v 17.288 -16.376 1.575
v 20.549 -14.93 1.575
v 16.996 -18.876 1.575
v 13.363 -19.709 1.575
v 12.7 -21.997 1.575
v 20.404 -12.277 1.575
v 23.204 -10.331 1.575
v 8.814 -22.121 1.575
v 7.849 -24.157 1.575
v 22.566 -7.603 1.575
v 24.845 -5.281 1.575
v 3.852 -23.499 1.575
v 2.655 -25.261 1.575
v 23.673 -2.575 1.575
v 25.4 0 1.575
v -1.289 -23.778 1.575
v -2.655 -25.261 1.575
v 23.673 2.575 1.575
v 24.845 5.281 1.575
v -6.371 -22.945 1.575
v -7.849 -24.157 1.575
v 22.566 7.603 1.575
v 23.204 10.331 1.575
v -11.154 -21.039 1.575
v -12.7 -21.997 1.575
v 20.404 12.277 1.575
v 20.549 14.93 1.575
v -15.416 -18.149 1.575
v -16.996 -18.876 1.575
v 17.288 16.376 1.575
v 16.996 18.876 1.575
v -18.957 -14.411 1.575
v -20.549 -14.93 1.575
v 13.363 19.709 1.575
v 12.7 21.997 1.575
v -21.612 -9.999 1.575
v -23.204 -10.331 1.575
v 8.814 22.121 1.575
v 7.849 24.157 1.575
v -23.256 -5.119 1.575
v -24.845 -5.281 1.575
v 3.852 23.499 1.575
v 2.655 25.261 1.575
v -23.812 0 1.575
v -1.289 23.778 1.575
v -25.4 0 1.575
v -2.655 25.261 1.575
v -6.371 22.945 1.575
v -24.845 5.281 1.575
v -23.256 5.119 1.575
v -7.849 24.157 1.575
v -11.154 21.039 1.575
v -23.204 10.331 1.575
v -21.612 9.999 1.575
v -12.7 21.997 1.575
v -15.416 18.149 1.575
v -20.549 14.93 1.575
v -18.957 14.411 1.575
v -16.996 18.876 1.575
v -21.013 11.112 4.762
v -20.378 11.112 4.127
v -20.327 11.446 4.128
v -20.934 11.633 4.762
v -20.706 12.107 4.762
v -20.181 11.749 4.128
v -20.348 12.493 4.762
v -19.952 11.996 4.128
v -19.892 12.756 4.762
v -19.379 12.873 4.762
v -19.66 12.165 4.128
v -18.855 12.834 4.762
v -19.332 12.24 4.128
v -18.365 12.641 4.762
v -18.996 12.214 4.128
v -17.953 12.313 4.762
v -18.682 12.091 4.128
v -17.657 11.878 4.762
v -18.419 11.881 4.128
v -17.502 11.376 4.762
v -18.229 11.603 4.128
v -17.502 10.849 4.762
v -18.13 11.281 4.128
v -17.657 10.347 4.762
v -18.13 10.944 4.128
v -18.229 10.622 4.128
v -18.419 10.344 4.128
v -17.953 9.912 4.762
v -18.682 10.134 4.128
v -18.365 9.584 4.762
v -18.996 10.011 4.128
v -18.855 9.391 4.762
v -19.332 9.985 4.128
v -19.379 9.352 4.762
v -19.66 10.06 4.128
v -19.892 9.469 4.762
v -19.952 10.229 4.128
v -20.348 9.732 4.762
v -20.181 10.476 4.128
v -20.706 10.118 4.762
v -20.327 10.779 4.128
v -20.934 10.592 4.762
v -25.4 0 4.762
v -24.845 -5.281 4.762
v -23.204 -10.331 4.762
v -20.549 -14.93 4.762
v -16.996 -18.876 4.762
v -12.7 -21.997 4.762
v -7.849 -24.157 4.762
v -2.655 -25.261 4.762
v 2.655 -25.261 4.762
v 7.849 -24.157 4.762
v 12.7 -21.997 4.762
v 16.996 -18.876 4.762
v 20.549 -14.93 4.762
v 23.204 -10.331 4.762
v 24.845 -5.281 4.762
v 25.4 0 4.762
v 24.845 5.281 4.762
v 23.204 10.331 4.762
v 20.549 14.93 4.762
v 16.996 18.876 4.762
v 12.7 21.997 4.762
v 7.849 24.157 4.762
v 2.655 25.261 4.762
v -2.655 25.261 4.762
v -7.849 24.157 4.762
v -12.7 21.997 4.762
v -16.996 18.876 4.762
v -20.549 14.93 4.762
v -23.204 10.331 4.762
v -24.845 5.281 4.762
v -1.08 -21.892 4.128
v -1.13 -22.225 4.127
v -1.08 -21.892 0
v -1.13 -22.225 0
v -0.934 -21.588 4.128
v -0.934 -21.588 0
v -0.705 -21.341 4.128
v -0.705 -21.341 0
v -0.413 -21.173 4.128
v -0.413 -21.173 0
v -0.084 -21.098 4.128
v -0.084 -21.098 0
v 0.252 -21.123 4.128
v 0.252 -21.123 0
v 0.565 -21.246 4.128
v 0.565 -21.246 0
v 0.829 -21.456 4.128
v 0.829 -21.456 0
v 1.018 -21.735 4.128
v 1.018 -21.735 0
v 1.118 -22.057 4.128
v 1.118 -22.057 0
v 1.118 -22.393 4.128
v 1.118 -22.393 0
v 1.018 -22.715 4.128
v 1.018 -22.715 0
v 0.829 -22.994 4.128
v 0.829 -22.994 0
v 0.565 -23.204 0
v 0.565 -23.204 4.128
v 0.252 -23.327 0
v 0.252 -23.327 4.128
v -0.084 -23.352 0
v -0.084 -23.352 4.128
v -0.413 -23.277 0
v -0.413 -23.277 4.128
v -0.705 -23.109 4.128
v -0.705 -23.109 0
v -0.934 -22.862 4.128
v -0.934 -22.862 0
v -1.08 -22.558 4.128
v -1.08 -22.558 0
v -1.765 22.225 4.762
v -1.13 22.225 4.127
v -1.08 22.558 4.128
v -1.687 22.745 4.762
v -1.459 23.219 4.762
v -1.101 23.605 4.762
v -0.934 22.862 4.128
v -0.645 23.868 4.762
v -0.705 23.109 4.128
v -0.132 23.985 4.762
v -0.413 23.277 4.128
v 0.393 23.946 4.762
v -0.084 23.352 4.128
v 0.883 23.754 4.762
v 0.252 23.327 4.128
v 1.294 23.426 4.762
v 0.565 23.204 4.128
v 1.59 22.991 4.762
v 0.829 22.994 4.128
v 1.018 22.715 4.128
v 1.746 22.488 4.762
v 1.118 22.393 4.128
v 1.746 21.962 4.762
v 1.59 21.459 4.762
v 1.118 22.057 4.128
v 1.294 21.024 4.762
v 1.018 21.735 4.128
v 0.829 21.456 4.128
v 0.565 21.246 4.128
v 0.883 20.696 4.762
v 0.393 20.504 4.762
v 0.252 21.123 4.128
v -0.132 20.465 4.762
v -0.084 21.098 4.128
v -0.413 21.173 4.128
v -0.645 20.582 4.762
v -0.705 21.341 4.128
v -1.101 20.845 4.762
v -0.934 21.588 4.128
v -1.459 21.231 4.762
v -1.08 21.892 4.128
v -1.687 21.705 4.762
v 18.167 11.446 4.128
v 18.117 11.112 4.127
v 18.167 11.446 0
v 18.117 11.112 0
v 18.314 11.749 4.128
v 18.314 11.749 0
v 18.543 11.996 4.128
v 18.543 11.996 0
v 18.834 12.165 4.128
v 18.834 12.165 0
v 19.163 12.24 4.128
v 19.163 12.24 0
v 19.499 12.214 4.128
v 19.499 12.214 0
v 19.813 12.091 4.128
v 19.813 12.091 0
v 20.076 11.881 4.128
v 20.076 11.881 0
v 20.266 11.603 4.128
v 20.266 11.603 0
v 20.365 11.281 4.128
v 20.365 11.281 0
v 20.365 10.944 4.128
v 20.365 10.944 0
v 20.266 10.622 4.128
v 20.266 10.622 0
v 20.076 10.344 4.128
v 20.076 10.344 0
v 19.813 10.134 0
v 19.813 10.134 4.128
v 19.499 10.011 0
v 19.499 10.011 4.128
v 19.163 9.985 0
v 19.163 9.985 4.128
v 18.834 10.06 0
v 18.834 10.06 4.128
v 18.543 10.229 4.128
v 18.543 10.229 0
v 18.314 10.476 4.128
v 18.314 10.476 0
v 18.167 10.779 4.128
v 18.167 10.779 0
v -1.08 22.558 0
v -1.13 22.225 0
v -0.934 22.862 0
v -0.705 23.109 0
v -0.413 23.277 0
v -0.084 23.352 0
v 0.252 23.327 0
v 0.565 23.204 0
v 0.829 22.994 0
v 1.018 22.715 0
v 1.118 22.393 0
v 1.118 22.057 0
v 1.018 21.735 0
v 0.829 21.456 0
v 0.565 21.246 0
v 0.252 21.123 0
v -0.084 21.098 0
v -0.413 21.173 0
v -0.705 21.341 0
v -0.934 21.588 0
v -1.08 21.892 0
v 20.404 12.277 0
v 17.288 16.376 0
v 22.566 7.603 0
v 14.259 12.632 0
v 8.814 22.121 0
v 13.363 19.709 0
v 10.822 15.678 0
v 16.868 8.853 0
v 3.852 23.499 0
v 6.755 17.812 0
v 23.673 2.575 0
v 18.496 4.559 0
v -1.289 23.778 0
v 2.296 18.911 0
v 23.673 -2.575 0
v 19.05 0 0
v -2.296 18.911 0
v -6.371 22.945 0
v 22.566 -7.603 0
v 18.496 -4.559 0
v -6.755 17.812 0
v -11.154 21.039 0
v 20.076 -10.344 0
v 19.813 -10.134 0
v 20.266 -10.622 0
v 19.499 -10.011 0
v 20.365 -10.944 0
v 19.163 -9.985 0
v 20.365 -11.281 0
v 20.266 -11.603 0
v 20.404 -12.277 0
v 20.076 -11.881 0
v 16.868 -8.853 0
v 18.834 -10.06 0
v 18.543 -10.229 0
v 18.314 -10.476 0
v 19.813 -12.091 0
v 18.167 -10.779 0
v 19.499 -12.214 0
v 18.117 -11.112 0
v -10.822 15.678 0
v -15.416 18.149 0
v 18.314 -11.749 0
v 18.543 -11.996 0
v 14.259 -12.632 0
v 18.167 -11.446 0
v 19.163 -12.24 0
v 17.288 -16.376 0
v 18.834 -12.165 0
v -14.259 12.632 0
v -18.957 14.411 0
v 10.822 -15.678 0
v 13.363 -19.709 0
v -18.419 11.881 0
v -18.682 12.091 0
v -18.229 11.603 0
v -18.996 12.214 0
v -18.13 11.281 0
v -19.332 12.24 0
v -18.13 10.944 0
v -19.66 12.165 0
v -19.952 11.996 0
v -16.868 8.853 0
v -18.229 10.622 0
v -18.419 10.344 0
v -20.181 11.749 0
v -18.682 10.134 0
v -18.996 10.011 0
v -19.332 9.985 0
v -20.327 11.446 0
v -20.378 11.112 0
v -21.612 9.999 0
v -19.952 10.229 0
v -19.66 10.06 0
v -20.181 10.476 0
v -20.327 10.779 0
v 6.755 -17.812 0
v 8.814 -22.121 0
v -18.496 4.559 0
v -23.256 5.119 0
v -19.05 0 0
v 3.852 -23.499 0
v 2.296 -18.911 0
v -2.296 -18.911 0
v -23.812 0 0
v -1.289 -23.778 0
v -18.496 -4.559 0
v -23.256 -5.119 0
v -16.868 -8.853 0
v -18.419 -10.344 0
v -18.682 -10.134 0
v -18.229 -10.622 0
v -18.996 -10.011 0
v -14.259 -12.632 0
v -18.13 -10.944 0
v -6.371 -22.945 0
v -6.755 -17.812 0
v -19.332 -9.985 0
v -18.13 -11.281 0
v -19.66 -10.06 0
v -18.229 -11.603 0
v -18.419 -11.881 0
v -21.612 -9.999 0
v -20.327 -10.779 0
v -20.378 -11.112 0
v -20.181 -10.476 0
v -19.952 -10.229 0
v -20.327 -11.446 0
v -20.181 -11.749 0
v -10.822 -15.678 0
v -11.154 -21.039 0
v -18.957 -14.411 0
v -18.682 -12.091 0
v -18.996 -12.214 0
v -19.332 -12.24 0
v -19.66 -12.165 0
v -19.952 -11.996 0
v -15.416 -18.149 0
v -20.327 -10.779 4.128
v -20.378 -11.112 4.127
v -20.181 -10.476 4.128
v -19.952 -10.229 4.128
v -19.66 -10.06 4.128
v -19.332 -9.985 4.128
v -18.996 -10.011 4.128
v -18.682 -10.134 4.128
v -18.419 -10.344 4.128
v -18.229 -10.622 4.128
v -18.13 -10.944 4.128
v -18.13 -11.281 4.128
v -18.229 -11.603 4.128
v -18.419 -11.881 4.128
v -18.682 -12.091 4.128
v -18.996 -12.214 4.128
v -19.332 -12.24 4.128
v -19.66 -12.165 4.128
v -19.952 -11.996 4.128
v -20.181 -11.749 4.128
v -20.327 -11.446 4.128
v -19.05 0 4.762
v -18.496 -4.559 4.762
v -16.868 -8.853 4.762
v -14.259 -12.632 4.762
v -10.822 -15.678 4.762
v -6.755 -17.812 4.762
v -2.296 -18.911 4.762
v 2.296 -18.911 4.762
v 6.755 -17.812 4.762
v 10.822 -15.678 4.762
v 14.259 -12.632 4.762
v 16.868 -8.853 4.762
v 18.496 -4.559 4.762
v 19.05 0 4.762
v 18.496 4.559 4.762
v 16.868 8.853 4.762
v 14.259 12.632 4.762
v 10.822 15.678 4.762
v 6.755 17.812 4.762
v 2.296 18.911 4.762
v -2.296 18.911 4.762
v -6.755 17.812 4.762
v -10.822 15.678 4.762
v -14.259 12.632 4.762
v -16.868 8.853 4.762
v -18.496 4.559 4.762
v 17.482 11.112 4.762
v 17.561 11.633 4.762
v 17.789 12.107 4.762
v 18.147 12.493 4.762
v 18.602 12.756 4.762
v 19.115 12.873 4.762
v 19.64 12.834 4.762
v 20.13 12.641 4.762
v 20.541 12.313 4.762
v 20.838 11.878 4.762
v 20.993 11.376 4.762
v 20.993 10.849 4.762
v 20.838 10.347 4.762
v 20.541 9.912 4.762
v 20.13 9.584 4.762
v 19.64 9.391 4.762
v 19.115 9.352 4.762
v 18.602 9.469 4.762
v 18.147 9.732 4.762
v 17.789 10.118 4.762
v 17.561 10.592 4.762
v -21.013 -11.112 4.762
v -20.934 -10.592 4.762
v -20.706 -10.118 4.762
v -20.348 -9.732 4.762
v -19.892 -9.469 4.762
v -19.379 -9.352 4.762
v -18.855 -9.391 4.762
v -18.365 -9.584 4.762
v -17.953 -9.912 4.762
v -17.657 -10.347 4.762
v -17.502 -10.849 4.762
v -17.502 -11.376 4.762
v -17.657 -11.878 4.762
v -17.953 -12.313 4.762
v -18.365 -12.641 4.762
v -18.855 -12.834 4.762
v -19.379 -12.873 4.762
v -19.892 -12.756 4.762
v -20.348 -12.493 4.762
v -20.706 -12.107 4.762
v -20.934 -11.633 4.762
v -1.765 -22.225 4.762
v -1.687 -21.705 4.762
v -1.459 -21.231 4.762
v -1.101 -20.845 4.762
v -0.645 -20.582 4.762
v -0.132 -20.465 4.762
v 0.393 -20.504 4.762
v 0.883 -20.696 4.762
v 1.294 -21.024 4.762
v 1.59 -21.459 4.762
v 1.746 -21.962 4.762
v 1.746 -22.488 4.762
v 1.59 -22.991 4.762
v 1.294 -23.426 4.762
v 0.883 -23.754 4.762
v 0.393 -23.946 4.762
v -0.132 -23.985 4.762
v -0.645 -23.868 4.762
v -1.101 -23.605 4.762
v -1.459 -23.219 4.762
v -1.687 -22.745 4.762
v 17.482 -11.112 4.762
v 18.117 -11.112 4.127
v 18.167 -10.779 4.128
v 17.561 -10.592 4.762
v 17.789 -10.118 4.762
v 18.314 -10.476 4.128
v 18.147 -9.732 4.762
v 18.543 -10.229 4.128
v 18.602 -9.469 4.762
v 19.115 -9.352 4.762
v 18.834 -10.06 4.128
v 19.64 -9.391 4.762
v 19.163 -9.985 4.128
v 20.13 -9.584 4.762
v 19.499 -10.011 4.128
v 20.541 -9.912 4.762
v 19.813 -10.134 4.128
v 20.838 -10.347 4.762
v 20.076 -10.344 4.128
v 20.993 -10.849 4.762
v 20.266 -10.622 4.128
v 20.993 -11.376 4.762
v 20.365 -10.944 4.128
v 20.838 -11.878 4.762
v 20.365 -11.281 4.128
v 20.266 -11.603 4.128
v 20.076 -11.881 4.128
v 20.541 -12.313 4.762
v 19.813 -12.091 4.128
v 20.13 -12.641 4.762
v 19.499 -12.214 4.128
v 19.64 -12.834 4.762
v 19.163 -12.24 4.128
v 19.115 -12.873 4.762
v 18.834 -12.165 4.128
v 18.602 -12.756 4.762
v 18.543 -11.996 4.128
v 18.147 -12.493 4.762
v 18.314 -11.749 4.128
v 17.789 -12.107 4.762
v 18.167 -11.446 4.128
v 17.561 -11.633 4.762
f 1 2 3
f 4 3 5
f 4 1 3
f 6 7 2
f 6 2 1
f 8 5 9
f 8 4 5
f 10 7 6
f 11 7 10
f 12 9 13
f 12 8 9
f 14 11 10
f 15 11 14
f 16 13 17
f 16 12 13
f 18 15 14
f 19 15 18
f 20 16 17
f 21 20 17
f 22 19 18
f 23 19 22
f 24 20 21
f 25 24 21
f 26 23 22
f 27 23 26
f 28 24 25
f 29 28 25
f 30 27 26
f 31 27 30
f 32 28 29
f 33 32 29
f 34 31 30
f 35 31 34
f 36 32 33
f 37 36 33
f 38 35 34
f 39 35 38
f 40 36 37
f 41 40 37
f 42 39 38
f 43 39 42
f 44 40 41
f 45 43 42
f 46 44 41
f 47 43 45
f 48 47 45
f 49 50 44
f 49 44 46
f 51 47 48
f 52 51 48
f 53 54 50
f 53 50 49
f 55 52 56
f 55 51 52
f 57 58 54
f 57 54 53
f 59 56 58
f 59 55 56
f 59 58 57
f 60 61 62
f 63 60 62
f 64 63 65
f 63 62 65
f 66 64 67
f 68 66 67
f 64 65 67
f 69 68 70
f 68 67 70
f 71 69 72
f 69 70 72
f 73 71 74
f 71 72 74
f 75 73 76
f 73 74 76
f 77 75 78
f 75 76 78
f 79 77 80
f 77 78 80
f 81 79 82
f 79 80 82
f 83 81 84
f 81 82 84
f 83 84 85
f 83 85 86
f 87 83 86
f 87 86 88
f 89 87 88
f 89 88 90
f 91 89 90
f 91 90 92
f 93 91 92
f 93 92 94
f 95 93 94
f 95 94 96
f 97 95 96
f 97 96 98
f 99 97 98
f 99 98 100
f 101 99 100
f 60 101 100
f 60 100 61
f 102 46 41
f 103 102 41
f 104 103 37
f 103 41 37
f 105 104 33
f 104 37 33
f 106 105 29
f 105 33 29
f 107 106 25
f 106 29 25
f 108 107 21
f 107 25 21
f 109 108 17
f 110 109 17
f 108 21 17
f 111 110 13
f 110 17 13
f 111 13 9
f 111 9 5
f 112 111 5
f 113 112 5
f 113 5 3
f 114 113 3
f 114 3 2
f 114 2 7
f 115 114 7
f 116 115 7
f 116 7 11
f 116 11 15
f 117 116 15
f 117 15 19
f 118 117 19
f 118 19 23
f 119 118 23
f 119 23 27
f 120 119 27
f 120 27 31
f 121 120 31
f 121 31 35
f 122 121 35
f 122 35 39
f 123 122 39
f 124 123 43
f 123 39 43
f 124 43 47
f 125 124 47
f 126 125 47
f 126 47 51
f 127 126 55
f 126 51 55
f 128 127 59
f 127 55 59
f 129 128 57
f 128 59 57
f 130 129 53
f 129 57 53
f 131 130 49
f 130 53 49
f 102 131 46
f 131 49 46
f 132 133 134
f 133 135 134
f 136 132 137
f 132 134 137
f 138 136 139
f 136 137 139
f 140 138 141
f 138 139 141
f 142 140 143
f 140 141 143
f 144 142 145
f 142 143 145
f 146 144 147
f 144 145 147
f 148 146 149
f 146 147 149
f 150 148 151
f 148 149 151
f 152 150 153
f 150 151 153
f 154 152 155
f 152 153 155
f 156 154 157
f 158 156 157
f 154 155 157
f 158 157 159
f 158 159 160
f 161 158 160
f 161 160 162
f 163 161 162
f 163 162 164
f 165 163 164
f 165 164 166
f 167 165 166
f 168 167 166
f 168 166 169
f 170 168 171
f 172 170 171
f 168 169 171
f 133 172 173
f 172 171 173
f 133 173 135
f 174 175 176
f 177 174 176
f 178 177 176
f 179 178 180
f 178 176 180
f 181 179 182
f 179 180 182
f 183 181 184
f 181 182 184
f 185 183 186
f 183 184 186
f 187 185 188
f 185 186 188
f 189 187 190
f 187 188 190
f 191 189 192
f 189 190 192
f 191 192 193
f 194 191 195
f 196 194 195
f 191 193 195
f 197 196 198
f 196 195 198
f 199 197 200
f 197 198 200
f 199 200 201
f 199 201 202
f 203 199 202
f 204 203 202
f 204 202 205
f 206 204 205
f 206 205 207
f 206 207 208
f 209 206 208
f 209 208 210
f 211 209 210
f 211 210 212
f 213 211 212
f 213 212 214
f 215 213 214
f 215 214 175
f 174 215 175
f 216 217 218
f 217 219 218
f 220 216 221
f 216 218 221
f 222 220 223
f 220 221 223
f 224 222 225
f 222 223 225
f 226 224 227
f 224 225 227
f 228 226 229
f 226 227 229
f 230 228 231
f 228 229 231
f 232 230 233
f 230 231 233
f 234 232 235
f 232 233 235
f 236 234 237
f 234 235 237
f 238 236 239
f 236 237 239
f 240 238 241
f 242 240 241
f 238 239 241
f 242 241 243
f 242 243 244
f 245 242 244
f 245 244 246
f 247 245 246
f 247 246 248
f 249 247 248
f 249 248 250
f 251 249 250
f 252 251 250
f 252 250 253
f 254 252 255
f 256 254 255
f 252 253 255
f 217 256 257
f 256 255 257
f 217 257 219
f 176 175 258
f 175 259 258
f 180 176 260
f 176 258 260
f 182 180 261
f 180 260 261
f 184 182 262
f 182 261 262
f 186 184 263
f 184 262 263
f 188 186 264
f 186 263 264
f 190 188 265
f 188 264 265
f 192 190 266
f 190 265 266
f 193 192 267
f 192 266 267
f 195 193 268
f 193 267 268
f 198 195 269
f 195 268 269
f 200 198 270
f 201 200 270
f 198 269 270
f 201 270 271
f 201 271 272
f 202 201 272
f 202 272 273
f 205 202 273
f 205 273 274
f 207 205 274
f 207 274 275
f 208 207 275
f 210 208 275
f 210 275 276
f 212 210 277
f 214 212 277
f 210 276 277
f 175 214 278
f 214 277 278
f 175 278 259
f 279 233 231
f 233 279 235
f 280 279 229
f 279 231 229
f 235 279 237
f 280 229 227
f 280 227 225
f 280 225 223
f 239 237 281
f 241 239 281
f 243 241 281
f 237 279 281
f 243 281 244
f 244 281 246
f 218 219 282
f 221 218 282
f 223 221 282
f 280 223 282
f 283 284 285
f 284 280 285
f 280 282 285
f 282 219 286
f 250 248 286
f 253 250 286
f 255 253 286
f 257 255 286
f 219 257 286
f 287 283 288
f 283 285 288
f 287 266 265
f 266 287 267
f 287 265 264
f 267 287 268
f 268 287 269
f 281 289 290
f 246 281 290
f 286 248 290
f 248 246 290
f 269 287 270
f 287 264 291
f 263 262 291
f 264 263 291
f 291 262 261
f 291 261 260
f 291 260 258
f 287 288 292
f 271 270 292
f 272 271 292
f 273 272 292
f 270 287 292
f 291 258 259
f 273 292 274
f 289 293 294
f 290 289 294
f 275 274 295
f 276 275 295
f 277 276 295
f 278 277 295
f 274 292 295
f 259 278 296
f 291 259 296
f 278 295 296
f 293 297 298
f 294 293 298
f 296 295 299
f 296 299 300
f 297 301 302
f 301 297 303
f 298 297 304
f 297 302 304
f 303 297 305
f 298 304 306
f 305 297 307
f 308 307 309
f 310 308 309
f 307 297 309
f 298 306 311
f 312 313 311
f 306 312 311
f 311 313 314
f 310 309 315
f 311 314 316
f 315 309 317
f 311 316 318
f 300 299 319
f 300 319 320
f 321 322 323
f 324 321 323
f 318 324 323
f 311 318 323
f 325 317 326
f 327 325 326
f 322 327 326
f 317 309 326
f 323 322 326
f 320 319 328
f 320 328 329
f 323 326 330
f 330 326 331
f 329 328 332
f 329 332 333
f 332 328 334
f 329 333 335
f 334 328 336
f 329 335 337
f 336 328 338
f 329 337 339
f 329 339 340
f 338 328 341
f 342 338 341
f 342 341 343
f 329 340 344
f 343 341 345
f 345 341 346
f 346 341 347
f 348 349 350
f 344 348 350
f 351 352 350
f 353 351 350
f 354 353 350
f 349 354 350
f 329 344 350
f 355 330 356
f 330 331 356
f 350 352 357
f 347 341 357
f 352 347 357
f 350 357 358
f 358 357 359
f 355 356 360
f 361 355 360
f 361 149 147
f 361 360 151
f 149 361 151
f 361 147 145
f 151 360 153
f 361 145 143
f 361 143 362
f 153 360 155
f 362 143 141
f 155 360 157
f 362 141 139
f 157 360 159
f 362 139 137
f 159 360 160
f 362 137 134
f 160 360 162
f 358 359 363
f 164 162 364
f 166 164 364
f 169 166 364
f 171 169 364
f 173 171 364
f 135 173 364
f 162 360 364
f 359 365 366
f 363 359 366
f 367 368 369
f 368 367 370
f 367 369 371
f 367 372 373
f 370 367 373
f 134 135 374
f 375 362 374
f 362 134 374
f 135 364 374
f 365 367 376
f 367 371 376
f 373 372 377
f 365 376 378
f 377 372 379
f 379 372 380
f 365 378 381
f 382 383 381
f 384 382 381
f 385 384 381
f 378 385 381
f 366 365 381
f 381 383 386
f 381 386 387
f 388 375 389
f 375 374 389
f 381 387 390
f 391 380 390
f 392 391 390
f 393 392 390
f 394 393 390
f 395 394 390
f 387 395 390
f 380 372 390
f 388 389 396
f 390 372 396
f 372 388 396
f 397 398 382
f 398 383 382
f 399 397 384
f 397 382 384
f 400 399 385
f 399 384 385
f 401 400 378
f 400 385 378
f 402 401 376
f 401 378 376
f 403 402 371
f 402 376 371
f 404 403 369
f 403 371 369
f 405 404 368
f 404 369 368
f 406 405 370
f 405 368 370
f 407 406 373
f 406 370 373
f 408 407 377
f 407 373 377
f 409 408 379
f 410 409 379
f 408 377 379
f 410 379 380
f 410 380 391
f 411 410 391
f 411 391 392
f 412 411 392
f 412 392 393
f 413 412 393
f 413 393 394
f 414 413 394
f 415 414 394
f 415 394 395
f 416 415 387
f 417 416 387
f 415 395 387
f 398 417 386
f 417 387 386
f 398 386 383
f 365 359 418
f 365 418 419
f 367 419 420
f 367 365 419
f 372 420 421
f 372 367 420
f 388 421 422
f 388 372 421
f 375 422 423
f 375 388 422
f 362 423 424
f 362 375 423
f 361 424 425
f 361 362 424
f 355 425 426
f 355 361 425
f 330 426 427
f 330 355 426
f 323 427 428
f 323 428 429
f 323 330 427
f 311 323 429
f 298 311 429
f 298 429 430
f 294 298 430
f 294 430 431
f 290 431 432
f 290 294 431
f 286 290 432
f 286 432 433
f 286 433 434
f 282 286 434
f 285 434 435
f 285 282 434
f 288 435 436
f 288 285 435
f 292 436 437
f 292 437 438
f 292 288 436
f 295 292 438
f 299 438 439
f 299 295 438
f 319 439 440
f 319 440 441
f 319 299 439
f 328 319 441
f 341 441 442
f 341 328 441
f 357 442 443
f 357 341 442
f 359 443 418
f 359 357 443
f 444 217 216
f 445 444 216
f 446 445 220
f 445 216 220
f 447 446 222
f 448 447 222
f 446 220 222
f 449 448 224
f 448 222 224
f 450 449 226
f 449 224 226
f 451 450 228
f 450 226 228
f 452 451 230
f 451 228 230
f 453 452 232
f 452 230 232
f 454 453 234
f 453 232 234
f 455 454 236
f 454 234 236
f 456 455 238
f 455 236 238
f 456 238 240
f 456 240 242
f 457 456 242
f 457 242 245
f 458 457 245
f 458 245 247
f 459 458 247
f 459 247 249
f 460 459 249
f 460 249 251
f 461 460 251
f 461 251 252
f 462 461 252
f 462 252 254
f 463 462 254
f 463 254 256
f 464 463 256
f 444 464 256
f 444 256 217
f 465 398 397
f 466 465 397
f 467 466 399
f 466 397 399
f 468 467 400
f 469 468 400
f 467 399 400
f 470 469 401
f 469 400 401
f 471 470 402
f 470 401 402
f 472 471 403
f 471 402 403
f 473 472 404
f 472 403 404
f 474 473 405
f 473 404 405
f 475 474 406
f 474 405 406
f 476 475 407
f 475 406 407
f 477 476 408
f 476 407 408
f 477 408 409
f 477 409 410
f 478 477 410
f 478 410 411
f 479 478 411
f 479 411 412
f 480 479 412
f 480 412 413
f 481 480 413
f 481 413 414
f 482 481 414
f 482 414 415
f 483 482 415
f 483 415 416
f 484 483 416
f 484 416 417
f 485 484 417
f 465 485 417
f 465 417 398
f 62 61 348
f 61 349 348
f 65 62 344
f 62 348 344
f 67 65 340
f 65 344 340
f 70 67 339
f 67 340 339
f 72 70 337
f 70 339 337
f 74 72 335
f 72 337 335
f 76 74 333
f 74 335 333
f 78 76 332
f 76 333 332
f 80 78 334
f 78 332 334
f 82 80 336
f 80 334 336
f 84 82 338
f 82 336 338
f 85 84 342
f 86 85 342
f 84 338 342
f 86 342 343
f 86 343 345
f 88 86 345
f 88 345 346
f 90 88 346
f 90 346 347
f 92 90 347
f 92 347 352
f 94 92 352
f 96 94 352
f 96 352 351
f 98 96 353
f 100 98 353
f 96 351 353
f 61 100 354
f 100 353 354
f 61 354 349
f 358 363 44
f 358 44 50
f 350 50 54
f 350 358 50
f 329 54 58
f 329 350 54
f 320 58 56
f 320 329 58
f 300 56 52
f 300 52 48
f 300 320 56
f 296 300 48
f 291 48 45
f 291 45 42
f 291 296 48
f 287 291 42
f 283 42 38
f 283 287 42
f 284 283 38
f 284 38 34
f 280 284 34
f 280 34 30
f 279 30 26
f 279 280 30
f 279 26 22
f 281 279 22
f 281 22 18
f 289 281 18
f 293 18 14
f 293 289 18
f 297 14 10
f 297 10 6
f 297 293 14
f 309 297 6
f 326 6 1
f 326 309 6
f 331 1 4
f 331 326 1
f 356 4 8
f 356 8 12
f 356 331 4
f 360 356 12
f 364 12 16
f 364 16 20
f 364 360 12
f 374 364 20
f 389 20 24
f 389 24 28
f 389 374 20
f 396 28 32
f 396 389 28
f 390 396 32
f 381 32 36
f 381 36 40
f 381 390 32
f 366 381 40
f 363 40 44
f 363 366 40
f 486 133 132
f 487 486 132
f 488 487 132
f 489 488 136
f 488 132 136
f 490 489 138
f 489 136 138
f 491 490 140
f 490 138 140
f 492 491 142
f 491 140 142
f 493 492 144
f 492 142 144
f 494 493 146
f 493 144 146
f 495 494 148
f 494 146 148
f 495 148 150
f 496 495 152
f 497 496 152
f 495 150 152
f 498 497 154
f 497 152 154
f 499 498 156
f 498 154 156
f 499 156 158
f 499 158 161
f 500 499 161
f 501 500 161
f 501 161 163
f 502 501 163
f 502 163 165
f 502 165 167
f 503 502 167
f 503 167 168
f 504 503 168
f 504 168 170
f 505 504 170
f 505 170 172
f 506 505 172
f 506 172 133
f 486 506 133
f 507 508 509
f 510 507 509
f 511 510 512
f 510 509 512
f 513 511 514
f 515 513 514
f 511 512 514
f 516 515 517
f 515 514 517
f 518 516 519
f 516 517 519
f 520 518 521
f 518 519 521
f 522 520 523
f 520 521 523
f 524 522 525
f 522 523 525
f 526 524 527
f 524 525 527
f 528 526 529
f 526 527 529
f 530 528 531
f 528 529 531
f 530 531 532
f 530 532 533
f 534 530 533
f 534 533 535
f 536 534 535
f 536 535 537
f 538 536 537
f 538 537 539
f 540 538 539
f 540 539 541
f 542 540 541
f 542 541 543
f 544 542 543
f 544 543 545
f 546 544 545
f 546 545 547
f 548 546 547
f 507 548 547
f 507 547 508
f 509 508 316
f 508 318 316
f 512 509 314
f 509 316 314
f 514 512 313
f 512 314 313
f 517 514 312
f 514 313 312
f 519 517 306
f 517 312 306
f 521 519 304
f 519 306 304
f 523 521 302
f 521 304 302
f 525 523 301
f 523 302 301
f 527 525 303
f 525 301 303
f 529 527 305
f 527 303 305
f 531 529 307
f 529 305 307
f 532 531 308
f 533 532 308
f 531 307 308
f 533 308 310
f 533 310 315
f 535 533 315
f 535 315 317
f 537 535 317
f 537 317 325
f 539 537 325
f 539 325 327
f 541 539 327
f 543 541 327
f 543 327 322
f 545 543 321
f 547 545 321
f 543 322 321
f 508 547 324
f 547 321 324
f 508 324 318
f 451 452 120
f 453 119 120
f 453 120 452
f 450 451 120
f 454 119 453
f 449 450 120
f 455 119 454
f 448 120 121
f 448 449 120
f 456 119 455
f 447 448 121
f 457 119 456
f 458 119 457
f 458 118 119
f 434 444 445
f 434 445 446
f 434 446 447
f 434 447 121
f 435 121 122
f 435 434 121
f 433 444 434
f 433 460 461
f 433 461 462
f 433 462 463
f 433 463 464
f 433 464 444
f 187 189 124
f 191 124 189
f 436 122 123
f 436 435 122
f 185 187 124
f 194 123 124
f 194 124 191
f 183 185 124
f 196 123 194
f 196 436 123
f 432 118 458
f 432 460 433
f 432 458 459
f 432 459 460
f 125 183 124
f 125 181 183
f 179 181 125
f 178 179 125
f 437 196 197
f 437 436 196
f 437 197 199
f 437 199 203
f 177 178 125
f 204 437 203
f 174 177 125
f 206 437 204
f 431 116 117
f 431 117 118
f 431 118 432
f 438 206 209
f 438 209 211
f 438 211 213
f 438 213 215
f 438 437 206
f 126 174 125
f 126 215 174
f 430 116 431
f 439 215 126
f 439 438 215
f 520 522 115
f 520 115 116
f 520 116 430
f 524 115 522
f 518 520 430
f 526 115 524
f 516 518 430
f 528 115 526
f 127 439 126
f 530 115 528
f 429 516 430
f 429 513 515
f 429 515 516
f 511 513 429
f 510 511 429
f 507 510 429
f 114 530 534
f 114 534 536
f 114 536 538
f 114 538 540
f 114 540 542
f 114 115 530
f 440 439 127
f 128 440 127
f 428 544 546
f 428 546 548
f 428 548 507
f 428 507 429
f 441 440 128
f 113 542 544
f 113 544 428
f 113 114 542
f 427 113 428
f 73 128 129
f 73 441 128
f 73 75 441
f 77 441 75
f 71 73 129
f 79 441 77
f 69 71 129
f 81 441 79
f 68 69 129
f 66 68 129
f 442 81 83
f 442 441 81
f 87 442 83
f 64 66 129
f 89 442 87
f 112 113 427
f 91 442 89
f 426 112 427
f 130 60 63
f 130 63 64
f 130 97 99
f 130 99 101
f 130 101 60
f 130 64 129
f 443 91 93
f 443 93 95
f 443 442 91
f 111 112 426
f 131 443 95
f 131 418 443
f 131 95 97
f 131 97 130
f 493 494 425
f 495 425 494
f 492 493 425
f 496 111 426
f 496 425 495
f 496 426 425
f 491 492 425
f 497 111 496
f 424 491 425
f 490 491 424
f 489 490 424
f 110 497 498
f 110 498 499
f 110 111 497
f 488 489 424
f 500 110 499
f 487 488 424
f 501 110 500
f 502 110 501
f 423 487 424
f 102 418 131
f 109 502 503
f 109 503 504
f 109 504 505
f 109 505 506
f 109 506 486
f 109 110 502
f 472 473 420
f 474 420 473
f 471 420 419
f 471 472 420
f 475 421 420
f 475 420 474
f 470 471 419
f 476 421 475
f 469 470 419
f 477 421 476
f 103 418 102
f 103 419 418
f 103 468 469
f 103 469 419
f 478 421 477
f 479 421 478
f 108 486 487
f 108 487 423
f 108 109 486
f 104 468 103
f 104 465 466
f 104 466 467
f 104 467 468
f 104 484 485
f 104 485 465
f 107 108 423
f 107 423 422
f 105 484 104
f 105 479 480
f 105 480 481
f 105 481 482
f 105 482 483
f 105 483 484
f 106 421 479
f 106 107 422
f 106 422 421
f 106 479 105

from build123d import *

# Parameters (mm, degrees)
SKETCH1_R                       = 25.4
SKETCH1_R_2                     = 19.05
BOSS_EXTRUDE1_DEPTH             = 4.7625
F_4_40_TAPPED_HOLE1_D           = 2.2606
F_4_40_TAPPED_HOLE1_DEPTH       = 7.62
F_4_40_TAPPED_HOLE1_CSINK_D     = 3.5306
F_4_40_TAPPED_HOLE1_CSINK_ANGLE = 90
F_4_40_TAPPED_HOLE1_TIP         = 0.679152758
SKETCH5_OUTSIDE_W               = 67.2
SKETCH5_OUTSIDE_H               = 67.2
SKETCH5_OUTSIDE_R               = 23.8125
CUT_EXTRUDE1_DEPTH              = 1.5748


with BuildPart() as part:
    # Sketch1 → Boss-Extrude1 (new body)
    with BuildSketch(Plane.XY):
        with Locations(Location((0, 0, 0), (0, 0, 180))):
            Circle(SKETCH1_R)
        with Locations(Location((0, 0, 0), (0, 0, 180))):
            Circle(SKETCH1_R_2, mode=Mode.SUBTRACT)
    extrude(amount=BOSS_EXTRUDE1_DEPTH)

    # #4-40 Tapped Hole1
    with Locations(Plane.XY.offset(4.7625)):
        with Locations((0, 22.225), (-19.247414599, 11.1125), (19.247414599, 11.1125), (19.247414599, -11.1125), (0, -22.225), (-19.247414599, -11.1125)):
            CounterSinkHole(F_4_40_TAPPED_HOLE1_D / 2, F_4_40_TAPPED_HOLE1_CSINK_D / 2, depth=F_4_40_TAPPED_HOLE1_DEPTH, counter_sink_angle=F_4_40_TAPPED_HOLE1_CSINK_ANGLE)
            with Locations((0, 0, -(F_4_40_TAPPED_HOLE1_DEPTH + F_4_40_TAPPED_HOLE1_TIP / 2))):  # 118° drill point
                Cone(0, F_4_40_TAPPED_HOLE1_D / 2, F_4_40_TAPPED_HOLE1_TIP, mode=Mode.SUBTRACT)

    # Sketch5 outside → Cut-Extrude1 (cut)
    with BuildSketch(Plane(origin=(0, 0, 0), x_dir=(-1, 0, 0), z_dir=(0, 0, -1))):
        Rectangle(SKETCH5_OUTSIDE_W, SKETCH5_OUTSIDE_H)
        Circle(SKETCH5_OUTSIDE_R, mode=Mode.SUBTRACT)
    extrude(amount=-CUT_EXTRUDE1_DEPTH, mode=Mode.SUBTRACT)


solid = part.part
